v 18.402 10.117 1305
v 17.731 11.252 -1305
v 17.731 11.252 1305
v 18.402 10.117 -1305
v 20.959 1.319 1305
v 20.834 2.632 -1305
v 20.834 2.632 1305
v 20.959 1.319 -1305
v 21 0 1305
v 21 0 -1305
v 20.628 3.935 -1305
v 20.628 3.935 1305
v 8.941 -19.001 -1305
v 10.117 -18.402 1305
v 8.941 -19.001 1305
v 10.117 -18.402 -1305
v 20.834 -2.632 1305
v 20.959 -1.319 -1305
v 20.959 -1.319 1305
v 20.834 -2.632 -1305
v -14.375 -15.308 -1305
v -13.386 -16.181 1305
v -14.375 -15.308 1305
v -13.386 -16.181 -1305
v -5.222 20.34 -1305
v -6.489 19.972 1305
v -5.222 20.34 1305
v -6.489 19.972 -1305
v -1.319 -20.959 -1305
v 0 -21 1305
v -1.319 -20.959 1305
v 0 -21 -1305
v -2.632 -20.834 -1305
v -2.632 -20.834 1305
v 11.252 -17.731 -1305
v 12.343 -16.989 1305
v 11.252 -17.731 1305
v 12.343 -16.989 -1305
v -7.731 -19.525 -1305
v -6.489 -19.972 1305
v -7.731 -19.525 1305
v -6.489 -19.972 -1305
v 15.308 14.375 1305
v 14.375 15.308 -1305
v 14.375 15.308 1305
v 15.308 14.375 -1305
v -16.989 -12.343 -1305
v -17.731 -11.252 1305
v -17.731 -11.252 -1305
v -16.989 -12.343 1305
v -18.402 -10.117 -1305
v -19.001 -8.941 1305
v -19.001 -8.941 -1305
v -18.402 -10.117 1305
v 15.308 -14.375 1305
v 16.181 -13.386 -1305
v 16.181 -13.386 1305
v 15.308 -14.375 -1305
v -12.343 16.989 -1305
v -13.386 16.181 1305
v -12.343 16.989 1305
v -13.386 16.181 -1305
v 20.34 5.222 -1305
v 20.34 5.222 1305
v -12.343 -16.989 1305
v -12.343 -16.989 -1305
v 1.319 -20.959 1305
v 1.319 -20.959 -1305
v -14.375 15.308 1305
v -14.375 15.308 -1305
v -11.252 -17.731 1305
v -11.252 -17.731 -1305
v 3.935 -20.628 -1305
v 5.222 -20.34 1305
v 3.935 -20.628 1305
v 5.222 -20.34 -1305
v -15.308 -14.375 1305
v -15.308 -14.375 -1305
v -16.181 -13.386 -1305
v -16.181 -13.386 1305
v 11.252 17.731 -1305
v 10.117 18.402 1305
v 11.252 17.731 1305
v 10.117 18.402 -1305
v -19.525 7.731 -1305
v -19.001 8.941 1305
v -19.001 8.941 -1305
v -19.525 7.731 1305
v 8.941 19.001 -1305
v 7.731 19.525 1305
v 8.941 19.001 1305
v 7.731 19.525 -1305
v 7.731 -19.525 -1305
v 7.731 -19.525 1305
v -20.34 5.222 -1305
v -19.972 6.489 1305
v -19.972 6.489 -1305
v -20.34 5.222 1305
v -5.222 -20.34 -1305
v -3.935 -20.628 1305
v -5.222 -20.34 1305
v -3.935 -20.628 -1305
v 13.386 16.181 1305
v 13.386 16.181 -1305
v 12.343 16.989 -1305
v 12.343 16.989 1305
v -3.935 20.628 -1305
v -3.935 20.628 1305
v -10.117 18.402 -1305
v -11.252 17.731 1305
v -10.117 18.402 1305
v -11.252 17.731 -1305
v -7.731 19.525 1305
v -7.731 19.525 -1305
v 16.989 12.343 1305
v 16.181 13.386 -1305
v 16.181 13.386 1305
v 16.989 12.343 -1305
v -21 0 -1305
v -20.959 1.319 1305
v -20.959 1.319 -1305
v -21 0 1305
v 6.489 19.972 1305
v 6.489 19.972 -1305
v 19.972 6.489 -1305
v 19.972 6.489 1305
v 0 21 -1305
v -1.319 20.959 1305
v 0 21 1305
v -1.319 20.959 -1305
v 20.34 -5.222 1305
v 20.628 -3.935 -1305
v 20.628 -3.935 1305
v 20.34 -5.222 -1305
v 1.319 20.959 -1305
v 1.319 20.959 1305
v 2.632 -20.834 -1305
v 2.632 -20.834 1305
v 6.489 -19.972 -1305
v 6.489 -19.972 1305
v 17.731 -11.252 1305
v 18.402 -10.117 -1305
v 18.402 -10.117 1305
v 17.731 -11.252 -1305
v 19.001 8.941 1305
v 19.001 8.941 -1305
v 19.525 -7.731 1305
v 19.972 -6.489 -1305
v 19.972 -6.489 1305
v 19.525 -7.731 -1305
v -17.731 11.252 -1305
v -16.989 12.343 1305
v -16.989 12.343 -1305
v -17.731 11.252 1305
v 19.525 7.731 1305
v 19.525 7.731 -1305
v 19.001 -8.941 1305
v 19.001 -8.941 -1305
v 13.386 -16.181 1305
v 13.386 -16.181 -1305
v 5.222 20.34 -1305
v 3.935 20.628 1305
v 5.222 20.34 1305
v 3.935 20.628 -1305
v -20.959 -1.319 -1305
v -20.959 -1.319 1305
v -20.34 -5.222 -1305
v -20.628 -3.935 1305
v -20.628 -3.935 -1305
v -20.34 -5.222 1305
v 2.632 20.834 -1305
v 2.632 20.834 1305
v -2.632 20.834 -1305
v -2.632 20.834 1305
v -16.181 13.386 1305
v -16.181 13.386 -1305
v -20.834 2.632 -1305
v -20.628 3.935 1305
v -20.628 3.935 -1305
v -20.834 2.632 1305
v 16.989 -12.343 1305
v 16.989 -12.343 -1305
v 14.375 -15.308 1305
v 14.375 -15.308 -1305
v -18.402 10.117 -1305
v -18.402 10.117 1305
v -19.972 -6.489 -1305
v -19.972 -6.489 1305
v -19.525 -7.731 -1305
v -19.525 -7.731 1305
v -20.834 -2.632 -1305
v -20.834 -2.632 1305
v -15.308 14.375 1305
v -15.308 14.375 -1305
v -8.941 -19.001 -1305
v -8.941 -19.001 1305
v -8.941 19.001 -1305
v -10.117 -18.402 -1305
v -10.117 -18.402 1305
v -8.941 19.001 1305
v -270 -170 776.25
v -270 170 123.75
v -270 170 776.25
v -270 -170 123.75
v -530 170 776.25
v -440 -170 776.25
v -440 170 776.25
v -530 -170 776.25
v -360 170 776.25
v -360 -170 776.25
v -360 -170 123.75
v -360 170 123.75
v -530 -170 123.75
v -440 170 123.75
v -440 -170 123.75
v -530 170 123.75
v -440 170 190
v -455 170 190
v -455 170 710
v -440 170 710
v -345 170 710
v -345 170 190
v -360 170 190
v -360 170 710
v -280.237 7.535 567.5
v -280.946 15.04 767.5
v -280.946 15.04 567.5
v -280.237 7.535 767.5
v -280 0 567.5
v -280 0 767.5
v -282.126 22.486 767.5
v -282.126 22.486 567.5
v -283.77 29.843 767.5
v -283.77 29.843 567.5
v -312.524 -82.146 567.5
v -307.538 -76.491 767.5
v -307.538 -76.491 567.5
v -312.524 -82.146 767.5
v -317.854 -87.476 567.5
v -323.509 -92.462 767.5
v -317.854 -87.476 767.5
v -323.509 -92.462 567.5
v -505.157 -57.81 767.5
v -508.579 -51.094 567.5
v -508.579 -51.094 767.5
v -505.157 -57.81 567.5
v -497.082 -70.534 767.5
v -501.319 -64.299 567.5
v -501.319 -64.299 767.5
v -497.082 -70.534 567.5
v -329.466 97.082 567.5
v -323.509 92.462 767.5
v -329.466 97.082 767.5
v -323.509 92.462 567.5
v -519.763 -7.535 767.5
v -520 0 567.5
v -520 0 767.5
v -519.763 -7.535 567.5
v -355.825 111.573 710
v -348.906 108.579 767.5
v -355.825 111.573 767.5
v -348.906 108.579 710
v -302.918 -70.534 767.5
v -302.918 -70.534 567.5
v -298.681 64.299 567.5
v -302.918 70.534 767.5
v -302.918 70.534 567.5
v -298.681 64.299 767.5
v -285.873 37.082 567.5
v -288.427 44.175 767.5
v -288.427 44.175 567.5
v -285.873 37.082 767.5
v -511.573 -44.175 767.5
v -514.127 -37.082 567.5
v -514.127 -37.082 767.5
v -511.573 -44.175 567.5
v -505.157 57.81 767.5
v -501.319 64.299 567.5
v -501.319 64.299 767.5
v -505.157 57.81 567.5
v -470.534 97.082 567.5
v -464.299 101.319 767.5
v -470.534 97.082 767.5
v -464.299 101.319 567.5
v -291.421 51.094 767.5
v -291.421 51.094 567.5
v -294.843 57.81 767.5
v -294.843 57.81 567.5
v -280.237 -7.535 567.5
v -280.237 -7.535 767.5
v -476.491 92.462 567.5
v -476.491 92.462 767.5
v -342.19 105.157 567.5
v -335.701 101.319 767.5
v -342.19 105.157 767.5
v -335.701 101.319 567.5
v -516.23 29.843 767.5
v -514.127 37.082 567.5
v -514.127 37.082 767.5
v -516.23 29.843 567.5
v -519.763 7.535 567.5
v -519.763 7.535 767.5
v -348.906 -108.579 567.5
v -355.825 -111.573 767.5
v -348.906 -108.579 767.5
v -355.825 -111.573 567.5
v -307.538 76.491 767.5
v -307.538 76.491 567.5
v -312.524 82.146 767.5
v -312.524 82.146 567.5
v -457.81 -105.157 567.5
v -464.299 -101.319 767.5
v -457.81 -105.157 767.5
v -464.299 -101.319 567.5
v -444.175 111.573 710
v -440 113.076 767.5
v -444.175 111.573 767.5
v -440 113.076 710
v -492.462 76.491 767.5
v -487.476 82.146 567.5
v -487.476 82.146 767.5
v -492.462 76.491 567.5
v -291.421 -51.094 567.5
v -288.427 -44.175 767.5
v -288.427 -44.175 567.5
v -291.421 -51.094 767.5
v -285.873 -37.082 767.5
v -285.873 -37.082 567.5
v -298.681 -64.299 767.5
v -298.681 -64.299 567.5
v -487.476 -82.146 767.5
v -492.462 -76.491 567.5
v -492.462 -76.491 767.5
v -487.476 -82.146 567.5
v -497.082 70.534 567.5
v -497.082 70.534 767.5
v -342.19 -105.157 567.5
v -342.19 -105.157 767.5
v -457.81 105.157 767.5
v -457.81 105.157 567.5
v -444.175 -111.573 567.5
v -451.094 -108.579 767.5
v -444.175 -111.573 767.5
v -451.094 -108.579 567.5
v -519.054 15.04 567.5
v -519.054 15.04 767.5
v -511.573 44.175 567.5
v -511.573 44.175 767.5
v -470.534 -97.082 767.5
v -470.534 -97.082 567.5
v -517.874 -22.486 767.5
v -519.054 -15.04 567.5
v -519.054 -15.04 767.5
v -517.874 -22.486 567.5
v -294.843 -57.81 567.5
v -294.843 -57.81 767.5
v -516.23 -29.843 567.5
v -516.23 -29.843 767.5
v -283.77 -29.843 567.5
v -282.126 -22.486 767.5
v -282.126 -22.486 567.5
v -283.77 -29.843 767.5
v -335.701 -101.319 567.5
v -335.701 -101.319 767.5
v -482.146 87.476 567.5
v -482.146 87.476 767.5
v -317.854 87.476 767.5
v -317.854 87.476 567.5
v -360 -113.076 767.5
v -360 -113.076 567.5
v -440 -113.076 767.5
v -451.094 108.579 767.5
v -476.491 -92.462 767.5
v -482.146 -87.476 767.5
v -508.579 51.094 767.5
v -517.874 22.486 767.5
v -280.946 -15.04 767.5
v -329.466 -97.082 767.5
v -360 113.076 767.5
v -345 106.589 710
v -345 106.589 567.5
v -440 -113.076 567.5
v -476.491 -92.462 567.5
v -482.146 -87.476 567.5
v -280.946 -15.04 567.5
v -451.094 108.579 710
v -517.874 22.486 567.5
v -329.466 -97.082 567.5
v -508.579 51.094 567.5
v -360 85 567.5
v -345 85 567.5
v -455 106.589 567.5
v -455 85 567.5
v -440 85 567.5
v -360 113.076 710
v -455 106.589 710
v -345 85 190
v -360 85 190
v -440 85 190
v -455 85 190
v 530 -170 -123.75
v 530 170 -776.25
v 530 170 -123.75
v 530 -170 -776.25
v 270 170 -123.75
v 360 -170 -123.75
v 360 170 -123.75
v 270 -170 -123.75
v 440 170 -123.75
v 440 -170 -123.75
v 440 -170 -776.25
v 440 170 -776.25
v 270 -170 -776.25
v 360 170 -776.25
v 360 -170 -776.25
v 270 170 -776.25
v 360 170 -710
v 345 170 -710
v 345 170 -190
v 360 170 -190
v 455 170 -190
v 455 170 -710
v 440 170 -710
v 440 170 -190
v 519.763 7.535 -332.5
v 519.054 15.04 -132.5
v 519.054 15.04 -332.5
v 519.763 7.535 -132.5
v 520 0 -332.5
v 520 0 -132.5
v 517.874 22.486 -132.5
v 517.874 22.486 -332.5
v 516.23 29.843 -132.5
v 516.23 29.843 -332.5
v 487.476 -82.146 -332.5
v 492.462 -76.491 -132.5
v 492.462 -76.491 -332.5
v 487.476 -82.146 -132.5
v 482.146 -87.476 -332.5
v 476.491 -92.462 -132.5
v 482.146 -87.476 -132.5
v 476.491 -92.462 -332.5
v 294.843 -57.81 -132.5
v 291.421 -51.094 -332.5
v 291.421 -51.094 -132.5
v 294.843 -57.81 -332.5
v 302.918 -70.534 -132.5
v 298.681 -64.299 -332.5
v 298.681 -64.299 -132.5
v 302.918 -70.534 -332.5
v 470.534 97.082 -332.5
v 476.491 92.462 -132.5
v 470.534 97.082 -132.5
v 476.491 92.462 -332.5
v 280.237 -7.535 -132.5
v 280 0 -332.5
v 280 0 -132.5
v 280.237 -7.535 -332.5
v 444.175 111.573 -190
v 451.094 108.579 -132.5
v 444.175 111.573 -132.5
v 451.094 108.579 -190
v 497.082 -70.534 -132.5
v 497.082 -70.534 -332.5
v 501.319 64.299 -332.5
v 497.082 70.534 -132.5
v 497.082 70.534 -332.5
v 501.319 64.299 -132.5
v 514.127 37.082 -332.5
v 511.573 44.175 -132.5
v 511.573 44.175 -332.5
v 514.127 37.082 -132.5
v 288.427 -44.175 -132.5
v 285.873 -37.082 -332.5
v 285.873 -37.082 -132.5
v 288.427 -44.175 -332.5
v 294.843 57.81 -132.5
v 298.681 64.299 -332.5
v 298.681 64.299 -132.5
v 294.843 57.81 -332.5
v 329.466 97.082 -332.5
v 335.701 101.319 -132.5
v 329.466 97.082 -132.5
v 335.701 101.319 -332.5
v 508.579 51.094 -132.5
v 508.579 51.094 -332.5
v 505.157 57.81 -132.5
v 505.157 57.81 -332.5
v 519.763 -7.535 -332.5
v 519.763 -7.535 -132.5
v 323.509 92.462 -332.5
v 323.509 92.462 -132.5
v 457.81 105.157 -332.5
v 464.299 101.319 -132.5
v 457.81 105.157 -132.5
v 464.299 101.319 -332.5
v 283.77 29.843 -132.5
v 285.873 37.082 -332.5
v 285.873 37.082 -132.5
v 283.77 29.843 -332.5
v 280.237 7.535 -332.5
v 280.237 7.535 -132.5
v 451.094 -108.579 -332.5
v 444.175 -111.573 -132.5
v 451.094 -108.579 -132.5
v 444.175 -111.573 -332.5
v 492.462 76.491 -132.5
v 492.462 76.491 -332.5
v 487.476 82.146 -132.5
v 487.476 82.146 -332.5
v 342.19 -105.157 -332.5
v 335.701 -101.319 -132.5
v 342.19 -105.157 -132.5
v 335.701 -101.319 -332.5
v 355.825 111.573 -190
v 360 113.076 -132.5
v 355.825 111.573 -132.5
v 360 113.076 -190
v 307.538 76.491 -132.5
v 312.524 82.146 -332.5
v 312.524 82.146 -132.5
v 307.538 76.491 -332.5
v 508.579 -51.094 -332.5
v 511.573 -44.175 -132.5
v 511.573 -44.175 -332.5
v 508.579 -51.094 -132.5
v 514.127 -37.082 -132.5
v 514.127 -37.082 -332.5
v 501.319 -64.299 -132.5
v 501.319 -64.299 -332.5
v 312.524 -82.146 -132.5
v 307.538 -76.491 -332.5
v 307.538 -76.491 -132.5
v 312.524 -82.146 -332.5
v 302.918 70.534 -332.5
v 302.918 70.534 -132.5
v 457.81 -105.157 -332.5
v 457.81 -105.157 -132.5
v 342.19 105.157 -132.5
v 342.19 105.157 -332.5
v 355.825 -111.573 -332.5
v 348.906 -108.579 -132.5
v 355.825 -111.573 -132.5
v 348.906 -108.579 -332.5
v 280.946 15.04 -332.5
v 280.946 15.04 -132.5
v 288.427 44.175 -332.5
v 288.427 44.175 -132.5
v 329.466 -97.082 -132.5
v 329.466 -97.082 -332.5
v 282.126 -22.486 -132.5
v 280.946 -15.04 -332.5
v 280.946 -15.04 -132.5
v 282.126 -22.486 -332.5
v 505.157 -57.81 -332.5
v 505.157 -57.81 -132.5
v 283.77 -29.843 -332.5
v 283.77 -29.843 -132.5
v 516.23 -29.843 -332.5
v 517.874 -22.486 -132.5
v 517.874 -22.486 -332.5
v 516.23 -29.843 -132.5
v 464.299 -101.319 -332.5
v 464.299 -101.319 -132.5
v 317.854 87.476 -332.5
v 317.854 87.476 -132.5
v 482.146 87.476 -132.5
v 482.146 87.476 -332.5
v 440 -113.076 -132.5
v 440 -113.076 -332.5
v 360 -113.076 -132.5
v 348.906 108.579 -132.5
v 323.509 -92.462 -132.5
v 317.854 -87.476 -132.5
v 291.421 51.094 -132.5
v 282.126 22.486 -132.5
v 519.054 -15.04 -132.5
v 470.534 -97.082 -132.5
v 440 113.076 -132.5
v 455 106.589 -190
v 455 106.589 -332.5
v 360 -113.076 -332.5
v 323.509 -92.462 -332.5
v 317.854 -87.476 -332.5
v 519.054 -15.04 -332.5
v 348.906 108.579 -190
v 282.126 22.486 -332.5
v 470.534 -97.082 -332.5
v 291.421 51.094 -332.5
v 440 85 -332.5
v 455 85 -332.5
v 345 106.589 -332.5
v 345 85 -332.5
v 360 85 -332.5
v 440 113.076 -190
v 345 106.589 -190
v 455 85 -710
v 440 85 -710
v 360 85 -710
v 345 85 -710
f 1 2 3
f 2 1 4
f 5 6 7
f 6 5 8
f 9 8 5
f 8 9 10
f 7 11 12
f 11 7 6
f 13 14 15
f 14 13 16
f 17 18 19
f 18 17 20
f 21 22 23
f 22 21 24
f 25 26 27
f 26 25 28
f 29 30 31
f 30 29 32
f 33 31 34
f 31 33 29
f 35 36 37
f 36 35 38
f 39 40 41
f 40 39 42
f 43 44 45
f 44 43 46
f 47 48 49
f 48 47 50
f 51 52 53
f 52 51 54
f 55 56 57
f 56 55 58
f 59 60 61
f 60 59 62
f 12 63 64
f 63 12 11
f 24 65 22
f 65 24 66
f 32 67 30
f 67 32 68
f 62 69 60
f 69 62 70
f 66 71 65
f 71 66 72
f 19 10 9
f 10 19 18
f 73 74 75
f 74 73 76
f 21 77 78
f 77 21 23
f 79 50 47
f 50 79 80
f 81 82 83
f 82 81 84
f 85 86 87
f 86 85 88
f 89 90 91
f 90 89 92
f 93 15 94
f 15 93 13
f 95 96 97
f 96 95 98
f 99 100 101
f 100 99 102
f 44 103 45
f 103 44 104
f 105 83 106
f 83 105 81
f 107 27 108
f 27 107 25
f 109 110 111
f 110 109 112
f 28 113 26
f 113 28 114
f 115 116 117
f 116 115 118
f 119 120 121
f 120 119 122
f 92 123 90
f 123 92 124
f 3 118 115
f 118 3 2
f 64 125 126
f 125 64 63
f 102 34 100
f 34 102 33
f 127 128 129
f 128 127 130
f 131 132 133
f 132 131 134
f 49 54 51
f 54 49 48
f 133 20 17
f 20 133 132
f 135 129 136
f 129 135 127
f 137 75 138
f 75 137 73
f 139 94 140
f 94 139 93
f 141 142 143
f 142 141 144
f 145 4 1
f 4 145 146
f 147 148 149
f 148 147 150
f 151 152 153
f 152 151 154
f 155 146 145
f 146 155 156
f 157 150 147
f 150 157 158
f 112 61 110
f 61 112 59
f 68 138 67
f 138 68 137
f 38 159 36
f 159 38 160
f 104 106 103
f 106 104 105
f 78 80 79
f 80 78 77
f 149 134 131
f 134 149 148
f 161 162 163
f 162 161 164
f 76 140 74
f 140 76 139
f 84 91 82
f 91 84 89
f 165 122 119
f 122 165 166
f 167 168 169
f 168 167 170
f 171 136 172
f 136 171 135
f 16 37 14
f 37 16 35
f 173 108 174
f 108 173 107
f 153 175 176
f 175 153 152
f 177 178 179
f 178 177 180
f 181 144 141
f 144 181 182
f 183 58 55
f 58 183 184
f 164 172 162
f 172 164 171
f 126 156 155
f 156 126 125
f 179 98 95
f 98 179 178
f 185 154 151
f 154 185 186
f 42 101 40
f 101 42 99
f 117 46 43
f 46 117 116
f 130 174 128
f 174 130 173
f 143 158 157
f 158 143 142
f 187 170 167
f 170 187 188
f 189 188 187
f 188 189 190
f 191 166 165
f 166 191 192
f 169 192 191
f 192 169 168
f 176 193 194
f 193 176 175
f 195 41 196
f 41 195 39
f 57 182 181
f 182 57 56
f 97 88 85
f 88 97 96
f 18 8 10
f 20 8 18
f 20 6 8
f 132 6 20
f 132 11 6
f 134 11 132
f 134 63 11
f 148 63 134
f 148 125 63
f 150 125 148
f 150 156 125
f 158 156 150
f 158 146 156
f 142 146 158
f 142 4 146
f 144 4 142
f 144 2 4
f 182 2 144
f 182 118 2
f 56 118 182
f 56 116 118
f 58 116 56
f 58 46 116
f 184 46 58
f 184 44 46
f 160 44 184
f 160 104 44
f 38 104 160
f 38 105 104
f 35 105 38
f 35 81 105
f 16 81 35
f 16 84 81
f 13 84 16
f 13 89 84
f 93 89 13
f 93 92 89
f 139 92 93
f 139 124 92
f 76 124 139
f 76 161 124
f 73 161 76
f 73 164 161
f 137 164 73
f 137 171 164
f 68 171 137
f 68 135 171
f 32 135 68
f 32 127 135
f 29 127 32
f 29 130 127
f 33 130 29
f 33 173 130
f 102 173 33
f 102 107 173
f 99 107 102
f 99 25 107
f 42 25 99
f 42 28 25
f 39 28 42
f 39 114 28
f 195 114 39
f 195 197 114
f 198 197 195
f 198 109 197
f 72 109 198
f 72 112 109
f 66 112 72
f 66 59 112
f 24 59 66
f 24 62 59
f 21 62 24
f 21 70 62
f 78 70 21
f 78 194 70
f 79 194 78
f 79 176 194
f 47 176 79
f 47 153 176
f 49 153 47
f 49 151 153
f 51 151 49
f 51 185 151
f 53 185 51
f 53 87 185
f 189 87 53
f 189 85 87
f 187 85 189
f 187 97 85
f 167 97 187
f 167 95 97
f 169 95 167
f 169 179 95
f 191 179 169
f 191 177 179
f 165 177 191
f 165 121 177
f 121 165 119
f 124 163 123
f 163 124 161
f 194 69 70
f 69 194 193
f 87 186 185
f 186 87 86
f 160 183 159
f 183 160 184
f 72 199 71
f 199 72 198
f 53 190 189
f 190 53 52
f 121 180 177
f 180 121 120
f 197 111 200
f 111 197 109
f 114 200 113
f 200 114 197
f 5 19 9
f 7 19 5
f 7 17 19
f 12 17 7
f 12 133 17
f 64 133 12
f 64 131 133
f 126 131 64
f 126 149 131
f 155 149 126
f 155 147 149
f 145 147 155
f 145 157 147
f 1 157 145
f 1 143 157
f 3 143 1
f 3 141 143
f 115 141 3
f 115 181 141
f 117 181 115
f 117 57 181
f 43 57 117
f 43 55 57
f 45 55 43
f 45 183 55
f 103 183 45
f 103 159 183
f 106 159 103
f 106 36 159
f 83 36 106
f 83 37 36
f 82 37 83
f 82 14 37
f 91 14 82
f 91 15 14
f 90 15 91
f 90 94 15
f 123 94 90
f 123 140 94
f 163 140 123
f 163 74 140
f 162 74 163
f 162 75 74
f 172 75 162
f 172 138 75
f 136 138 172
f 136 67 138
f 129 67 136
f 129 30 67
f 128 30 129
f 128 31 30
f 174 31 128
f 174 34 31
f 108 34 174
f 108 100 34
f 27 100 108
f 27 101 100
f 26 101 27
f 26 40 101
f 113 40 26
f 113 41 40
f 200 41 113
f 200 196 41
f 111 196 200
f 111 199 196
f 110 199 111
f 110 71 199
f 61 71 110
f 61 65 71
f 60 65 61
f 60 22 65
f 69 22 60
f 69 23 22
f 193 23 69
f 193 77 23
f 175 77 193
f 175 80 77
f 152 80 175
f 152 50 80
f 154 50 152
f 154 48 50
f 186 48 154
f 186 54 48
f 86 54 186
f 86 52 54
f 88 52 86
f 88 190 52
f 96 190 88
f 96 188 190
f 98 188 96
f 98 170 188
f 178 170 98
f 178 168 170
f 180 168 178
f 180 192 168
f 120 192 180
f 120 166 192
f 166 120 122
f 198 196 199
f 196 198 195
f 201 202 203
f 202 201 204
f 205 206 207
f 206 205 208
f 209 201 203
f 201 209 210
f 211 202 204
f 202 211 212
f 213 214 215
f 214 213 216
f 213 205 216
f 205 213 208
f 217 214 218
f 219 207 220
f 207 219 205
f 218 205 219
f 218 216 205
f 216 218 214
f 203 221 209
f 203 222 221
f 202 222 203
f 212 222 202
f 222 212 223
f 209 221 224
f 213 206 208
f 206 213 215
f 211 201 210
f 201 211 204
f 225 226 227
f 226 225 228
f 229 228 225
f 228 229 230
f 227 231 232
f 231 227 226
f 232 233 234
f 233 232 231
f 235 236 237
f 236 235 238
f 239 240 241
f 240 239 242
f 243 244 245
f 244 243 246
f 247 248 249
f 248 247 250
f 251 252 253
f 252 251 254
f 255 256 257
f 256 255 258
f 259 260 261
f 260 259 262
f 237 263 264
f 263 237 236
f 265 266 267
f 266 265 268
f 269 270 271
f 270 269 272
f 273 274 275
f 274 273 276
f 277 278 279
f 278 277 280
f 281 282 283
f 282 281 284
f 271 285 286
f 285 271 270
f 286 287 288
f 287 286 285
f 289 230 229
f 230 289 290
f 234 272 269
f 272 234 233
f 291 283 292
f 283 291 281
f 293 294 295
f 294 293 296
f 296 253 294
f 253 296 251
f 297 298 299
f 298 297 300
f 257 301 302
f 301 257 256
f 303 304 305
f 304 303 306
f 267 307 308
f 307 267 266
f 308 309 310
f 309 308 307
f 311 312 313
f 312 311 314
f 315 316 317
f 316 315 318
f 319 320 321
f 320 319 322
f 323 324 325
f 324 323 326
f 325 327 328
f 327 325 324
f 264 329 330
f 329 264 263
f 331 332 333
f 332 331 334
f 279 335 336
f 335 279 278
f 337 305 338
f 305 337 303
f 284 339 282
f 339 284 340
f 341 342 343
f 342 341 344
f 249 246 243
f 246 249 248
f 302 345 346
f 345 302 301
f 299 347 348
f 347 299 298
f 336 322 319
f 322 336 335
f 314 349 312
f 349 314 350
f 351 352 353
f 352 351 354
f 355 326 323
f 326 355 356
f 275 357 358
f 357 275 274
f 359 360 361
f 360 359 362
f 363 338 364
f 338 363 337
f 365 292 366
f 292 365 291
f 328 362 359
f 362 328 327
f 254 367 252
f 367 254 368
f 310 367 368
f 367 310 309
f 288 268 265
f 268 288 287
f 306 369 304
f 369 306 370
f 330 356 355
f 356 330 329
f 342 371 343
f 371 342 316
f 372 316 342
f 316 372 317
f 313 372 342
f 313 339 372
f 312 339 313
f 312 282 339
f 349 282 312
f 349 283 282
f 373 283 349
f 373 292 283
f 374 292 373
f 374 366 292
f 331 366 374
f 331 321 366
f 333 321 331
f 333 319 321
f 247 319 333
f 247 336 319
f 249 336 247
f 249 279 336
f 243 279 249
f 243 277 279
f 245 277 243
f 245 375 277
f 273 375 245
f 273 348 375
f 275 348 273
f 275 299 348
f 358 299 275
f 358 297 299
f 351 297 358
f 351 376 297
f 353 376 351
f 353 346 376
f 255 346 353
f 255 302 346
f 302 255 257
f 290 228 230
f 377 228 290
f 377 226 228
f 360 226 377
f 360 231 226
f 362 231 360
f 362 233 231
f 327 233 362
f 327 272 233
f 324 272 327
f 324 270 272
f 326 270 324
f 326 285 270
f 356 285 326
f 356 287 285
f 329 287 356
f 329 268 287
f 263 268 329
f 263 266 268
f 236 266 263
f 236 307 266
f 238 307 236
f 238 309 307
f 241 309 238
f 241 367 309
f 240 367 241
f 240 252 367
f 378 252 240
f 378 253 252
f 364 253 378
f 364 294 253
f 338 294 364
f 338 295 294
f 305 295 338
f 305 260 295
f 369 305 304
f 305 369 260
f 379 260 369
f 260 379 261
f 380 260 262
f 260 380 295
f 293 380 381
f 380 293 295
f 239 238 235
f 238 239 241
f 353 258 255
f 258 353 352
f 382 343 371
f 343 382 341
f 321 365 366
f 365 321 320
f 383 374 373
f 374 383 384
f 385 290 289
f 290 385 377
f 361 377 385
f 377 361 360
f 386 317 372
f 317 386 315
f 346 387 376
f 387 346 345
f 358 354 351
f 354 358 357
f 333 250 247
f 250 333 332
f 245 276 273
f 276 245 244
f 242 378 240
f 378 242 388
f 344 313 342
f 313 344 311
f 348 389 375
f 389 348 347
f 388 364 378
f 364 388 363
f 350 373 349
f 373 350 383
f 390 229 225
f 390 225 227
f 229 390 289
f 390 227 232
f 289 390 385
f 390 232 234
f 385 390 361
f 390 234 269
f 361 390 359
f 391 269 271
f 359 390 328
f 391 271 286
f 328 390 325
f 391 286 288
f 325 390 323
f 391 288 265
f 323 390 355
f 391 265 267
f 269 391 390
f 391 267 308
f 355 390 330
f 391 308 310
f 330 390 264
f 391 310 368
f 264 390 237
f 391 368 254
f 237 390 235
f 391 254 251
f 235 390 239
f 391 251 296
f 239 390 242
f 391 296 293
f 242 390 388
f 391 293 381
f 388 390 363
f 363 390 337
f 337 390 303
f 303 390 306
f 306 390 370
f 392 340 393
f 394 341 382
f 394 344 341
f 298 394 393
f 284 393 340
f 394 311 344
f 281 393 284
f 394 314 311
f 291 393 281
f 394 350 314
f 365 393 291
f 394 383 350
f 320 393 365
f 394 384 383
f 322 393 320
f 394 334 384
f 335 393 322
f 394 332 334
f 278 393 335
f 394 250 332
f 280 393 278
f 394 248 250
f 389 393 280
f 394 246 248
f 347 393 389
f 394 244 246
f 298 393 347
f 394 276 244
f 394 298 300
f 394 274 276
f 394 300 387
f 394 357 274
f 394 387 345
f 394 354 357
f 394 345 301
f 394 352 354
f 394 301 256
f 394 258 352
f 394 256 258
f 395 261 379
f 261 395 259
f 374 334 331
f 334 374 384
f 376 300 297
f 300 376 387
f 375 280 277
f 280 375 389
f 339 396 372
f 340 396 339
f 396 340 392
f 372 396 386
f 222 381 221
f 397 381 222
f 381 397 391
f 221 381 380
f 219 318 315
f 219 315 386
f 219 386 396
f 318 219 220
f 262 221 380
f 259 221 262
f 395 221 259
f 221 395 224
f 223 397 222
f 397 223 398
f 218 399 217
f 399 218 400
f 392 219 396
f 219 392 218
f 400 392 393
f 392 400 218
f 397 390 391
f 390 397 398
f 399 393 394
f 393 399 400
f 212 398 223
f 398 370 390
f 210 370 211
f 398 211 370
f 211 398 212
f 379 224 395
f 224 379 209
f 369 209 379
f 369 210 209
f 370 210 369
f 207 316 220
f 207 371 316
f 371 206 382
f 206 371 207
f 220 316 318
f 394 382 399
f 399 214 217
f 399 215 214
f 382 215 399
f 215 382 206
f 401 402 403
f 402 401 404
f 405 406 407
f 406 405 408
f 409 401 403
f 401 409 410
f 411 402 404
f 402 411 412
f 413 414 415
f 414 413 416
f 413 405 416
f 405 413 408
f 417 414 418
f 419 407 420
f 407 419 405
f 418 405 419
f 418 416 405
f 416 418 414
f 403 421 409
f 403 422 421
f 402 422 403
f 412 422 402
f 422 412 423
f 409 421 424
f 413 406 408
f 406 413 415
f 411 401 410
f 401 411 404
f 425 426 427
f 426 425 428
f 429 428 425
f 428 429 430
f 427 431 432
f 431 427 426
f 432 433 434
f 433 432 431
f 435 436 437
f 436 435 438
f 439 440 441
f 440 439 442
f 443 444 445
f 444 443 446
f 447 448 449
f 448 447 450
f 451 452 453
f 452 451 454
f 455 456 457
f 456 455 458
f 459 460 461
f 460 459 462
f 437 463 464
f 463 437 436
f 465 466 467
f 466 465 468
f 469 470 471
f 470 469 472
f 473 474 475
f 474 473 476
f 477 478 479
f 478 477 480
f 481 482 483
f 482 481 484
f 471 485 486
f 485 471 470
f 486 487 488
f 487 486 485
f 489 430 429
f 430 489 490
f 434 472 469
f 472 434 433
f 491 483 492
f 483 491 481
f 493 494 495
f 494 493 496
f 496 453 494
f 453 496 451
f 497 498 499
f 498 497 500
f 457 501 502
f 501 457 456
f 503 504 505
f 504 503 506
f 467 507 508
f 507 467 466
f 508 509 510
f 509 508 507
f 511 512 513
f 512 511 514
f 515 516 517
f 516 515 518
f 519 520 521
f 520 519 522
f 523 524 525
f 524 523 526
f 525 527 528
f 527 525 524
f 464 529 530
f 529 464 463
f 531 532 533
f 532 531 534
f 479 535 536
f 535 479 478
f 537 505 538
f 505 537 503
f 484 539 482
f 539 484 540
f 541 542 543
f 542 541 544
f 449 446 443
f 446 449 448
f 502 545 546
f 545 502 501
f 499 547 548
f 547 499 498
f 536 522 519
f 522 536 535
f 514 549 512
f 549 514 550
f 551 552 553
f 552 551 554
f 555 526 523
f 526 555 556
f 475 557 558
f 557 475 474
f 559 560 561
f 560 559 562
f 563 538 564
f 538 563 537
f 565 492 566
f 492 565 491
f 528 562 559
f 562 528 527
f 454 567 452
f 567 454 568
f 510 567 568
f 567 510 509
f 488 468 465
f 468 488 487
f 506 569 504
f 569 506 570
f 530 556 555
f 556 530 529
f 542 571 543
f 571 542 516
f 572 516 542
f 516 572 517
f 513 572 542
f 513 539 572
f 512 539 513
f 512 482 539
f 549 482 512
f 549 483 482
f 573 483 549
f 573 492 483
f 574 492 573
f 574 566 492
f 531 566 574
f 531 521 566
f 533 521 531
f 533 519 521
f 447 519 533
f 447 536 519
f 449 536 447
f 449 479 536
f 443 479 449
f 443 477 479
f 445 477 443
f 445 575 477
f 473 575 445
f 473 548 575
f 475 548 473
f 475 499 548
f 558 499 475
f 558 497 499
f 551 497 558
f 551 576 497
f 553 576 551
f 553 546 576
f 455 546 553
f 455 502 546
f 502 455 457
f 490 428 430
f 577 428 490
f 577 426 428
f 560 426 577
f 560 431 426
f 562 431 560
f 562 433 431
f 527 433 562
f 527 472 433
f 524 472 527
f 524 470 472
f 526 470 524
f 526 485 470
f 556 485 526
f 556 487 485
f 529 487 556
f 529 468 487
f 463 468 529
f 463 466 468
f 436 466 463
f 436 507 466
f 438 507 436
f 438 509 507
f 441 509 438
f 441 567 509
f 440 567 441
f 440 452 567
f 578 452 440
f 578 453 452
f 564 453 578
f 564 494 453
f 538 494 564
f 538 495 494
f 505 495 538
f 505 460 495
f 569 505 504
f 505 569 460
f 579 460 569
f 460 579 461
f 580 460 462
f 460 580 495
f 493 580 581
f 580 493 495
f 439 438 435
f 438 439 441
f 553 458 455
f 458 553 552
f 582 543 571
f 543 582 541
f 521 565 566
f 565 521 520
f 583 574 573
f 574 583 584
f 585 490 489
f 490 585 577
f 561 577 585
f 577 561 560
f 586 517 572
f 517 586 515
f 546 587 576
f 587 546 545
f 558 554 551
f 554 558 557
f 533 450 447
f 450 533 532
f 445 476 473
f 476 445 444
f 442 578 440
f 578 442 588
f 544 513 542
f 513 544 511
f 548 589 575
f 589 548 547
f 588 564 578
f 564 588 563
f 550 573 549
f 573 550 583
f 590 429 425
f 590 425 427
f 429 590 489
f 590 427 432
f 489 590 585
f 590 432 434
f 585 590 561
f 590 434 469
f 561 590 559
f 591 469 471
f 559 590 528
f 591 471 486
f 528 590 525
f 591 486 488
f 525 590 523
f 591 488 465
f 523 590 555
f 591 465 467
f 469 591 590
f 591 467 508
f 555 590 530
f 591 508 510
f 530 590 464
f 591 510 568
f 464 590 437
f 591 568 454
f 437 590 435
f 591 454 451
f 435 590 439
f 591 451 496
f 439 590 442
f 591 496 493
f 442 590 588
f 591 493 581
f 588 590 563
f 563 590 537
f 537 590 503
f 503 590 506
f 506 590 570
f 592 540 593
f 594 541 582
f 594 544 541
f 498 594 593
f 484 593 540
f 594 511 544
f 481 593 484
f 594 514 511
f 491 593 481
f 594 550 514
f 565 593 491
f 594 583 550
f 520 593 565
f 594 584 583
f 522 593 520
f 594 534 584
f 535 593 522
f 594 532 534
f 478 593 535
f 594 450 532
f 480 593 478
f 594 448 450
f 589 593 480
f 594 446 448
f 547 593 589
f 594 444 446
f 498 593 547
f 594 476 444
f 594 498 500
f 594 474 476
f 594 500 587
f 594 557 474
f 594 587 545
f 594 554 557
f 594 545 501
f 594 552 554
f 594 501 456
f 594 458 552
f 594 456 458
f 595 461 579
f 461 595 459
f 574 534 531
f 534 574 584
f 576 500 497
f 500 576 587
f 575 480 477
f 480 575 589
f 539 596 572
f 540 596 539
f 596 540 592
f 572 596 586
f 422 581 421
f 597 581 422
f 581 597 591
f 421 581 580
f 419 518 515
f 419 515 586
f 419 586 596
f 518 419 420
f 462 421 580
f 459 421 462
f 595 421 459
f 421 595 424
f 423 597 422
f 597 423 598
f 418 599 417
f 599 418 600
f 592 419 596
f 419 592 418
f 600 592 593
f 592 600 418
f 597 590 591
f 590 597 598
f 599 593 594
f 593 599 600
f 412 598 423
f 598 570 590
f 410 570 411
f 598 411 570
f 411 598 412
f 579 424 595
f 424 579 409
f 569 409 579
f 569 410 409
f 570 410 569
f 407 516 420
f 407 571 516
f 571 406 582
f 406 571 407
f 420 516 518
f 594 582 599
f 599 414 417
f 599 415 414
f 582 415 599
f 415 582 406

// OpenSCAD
// ============================================================================
// PROJECT: XXXG-00W0 WING GUNDAM ZERO EW - AIRFRAME STRUCTURAL CORE
// COMPONENT VAULT: BANDAI CAST RUNNER F - CHEST STABILIZERS F18 & F19
// COOLING SPECS: STRESS-INDUCED THERMOACOUSTIC PIEZO-ELASTIC INTEGRATION
// PARITY INTERFACE: PARALLEL CROSS SLIDES FOR SQUARE-WAVE RETROFITTING
// ============================================================================

$fn = 100; // Circular segment rendering resolution count

// Structural Constants Scaled 1:1 for a 16.7-Meter Airframe Scale (mm)
stabilizer_beam_length = 1450;          // Total transverse tracking span (mm)
pivot_hinge_diameter = 240;             // Multi-axis attachment pin bore (mm)
titanium_core_wall = 65;                // Solid TiAl structural wall thickness (mm)
harness_conduit_width = 80;             // Cast-in 4oz copper logic trace track (mm)
slider_track_stroke = 520;              // F18/F19 lateral slide travel envelope (mm)

module Runner_F_Stabilizer_Forge() {
    // Central Supply Injection Runner Axis (Molten Feed Line from Siphon Forge)
    color([0.24, 0.24, 0.26]) {
        cylinder(h = stabilizer_beam_length * 1.8, d = 42, center = true);
        // Direct injection gates tracking straight into the part mold cavities
        translate() rotate() cylinder(h = 450, d = 22);
        translate([0, 0, -450]) rotate() cylinder(h = 450, d = 22);
    }
    
    // Instantiate Scaled Structural Molds Symmetrically (Left & Right Halves)
    Cast_Internal_Chest_Stabilizers();
}

module Cast_Internal_Chest_Stabilizers() {
    // ---- PART F18: LEFT INTERNAL SHOULDER BLADE TRACKING LINK ---- [Page 5, Step 02-5]
    translate([-400, 0, 450]) color([0.45, 0.45, 0.48]) { // Inner Frame Dark Spec
        difference() {
            // Main solid heavy-duty parallel stabilization slider arm
            cube([260, 340, stabilizer_beam_length * 0.45], center = true);
            
            // Central Multi-Axis Cross-Pivot Attachment Pin Hole
            translate([0, 0, (stabilizer_beam_length * 0.15)])
                rotate()
                    cylinder(h = 200, d = pivot_hinge_diameter, center = true);
            
            // Linear Sliding Guide Track Cutout (DLC Liner Clearance)
            translate([0, (340/2 - 40), 0])
                cube([110, 90, slider_track_stroke], center = true);
                
            // Continuous cast-in routing track for the 4oz solid-state wiring rails
            cube([harness_conduit_width, 340 + 10, stabilizer_beam_length], center = true);
        }
    }
    
    // ---- PART F19: RIGHT INTERNAL SHOULDER BLADE TRACKING LINK ---- [Page 5, Step 02-5]
    translate([400, 0, -450]) rotate() color([0.45, 0.45, 0.48]) {
        difference() {
            cube([260, 340, stabilizer_beam_length * 0.45], center = true);
            translate([0, 0, (stabilizer_beam_length * 0.15)])
                rotate()
                    cylinder(h = 200, d = pivot_hinge_diameter, center = true);
            translate([0, (340/2 - 40), 0])
                cube([110, 90, slider_track_stroke], center = true);
            cube([harness_conduit_width, 340 + 10, stabilizer_beam_length], center = true);
        }
    }
}

// Render Master Assembly to Parameter Workspace
Runner_F_Stabilizer_Forge();
